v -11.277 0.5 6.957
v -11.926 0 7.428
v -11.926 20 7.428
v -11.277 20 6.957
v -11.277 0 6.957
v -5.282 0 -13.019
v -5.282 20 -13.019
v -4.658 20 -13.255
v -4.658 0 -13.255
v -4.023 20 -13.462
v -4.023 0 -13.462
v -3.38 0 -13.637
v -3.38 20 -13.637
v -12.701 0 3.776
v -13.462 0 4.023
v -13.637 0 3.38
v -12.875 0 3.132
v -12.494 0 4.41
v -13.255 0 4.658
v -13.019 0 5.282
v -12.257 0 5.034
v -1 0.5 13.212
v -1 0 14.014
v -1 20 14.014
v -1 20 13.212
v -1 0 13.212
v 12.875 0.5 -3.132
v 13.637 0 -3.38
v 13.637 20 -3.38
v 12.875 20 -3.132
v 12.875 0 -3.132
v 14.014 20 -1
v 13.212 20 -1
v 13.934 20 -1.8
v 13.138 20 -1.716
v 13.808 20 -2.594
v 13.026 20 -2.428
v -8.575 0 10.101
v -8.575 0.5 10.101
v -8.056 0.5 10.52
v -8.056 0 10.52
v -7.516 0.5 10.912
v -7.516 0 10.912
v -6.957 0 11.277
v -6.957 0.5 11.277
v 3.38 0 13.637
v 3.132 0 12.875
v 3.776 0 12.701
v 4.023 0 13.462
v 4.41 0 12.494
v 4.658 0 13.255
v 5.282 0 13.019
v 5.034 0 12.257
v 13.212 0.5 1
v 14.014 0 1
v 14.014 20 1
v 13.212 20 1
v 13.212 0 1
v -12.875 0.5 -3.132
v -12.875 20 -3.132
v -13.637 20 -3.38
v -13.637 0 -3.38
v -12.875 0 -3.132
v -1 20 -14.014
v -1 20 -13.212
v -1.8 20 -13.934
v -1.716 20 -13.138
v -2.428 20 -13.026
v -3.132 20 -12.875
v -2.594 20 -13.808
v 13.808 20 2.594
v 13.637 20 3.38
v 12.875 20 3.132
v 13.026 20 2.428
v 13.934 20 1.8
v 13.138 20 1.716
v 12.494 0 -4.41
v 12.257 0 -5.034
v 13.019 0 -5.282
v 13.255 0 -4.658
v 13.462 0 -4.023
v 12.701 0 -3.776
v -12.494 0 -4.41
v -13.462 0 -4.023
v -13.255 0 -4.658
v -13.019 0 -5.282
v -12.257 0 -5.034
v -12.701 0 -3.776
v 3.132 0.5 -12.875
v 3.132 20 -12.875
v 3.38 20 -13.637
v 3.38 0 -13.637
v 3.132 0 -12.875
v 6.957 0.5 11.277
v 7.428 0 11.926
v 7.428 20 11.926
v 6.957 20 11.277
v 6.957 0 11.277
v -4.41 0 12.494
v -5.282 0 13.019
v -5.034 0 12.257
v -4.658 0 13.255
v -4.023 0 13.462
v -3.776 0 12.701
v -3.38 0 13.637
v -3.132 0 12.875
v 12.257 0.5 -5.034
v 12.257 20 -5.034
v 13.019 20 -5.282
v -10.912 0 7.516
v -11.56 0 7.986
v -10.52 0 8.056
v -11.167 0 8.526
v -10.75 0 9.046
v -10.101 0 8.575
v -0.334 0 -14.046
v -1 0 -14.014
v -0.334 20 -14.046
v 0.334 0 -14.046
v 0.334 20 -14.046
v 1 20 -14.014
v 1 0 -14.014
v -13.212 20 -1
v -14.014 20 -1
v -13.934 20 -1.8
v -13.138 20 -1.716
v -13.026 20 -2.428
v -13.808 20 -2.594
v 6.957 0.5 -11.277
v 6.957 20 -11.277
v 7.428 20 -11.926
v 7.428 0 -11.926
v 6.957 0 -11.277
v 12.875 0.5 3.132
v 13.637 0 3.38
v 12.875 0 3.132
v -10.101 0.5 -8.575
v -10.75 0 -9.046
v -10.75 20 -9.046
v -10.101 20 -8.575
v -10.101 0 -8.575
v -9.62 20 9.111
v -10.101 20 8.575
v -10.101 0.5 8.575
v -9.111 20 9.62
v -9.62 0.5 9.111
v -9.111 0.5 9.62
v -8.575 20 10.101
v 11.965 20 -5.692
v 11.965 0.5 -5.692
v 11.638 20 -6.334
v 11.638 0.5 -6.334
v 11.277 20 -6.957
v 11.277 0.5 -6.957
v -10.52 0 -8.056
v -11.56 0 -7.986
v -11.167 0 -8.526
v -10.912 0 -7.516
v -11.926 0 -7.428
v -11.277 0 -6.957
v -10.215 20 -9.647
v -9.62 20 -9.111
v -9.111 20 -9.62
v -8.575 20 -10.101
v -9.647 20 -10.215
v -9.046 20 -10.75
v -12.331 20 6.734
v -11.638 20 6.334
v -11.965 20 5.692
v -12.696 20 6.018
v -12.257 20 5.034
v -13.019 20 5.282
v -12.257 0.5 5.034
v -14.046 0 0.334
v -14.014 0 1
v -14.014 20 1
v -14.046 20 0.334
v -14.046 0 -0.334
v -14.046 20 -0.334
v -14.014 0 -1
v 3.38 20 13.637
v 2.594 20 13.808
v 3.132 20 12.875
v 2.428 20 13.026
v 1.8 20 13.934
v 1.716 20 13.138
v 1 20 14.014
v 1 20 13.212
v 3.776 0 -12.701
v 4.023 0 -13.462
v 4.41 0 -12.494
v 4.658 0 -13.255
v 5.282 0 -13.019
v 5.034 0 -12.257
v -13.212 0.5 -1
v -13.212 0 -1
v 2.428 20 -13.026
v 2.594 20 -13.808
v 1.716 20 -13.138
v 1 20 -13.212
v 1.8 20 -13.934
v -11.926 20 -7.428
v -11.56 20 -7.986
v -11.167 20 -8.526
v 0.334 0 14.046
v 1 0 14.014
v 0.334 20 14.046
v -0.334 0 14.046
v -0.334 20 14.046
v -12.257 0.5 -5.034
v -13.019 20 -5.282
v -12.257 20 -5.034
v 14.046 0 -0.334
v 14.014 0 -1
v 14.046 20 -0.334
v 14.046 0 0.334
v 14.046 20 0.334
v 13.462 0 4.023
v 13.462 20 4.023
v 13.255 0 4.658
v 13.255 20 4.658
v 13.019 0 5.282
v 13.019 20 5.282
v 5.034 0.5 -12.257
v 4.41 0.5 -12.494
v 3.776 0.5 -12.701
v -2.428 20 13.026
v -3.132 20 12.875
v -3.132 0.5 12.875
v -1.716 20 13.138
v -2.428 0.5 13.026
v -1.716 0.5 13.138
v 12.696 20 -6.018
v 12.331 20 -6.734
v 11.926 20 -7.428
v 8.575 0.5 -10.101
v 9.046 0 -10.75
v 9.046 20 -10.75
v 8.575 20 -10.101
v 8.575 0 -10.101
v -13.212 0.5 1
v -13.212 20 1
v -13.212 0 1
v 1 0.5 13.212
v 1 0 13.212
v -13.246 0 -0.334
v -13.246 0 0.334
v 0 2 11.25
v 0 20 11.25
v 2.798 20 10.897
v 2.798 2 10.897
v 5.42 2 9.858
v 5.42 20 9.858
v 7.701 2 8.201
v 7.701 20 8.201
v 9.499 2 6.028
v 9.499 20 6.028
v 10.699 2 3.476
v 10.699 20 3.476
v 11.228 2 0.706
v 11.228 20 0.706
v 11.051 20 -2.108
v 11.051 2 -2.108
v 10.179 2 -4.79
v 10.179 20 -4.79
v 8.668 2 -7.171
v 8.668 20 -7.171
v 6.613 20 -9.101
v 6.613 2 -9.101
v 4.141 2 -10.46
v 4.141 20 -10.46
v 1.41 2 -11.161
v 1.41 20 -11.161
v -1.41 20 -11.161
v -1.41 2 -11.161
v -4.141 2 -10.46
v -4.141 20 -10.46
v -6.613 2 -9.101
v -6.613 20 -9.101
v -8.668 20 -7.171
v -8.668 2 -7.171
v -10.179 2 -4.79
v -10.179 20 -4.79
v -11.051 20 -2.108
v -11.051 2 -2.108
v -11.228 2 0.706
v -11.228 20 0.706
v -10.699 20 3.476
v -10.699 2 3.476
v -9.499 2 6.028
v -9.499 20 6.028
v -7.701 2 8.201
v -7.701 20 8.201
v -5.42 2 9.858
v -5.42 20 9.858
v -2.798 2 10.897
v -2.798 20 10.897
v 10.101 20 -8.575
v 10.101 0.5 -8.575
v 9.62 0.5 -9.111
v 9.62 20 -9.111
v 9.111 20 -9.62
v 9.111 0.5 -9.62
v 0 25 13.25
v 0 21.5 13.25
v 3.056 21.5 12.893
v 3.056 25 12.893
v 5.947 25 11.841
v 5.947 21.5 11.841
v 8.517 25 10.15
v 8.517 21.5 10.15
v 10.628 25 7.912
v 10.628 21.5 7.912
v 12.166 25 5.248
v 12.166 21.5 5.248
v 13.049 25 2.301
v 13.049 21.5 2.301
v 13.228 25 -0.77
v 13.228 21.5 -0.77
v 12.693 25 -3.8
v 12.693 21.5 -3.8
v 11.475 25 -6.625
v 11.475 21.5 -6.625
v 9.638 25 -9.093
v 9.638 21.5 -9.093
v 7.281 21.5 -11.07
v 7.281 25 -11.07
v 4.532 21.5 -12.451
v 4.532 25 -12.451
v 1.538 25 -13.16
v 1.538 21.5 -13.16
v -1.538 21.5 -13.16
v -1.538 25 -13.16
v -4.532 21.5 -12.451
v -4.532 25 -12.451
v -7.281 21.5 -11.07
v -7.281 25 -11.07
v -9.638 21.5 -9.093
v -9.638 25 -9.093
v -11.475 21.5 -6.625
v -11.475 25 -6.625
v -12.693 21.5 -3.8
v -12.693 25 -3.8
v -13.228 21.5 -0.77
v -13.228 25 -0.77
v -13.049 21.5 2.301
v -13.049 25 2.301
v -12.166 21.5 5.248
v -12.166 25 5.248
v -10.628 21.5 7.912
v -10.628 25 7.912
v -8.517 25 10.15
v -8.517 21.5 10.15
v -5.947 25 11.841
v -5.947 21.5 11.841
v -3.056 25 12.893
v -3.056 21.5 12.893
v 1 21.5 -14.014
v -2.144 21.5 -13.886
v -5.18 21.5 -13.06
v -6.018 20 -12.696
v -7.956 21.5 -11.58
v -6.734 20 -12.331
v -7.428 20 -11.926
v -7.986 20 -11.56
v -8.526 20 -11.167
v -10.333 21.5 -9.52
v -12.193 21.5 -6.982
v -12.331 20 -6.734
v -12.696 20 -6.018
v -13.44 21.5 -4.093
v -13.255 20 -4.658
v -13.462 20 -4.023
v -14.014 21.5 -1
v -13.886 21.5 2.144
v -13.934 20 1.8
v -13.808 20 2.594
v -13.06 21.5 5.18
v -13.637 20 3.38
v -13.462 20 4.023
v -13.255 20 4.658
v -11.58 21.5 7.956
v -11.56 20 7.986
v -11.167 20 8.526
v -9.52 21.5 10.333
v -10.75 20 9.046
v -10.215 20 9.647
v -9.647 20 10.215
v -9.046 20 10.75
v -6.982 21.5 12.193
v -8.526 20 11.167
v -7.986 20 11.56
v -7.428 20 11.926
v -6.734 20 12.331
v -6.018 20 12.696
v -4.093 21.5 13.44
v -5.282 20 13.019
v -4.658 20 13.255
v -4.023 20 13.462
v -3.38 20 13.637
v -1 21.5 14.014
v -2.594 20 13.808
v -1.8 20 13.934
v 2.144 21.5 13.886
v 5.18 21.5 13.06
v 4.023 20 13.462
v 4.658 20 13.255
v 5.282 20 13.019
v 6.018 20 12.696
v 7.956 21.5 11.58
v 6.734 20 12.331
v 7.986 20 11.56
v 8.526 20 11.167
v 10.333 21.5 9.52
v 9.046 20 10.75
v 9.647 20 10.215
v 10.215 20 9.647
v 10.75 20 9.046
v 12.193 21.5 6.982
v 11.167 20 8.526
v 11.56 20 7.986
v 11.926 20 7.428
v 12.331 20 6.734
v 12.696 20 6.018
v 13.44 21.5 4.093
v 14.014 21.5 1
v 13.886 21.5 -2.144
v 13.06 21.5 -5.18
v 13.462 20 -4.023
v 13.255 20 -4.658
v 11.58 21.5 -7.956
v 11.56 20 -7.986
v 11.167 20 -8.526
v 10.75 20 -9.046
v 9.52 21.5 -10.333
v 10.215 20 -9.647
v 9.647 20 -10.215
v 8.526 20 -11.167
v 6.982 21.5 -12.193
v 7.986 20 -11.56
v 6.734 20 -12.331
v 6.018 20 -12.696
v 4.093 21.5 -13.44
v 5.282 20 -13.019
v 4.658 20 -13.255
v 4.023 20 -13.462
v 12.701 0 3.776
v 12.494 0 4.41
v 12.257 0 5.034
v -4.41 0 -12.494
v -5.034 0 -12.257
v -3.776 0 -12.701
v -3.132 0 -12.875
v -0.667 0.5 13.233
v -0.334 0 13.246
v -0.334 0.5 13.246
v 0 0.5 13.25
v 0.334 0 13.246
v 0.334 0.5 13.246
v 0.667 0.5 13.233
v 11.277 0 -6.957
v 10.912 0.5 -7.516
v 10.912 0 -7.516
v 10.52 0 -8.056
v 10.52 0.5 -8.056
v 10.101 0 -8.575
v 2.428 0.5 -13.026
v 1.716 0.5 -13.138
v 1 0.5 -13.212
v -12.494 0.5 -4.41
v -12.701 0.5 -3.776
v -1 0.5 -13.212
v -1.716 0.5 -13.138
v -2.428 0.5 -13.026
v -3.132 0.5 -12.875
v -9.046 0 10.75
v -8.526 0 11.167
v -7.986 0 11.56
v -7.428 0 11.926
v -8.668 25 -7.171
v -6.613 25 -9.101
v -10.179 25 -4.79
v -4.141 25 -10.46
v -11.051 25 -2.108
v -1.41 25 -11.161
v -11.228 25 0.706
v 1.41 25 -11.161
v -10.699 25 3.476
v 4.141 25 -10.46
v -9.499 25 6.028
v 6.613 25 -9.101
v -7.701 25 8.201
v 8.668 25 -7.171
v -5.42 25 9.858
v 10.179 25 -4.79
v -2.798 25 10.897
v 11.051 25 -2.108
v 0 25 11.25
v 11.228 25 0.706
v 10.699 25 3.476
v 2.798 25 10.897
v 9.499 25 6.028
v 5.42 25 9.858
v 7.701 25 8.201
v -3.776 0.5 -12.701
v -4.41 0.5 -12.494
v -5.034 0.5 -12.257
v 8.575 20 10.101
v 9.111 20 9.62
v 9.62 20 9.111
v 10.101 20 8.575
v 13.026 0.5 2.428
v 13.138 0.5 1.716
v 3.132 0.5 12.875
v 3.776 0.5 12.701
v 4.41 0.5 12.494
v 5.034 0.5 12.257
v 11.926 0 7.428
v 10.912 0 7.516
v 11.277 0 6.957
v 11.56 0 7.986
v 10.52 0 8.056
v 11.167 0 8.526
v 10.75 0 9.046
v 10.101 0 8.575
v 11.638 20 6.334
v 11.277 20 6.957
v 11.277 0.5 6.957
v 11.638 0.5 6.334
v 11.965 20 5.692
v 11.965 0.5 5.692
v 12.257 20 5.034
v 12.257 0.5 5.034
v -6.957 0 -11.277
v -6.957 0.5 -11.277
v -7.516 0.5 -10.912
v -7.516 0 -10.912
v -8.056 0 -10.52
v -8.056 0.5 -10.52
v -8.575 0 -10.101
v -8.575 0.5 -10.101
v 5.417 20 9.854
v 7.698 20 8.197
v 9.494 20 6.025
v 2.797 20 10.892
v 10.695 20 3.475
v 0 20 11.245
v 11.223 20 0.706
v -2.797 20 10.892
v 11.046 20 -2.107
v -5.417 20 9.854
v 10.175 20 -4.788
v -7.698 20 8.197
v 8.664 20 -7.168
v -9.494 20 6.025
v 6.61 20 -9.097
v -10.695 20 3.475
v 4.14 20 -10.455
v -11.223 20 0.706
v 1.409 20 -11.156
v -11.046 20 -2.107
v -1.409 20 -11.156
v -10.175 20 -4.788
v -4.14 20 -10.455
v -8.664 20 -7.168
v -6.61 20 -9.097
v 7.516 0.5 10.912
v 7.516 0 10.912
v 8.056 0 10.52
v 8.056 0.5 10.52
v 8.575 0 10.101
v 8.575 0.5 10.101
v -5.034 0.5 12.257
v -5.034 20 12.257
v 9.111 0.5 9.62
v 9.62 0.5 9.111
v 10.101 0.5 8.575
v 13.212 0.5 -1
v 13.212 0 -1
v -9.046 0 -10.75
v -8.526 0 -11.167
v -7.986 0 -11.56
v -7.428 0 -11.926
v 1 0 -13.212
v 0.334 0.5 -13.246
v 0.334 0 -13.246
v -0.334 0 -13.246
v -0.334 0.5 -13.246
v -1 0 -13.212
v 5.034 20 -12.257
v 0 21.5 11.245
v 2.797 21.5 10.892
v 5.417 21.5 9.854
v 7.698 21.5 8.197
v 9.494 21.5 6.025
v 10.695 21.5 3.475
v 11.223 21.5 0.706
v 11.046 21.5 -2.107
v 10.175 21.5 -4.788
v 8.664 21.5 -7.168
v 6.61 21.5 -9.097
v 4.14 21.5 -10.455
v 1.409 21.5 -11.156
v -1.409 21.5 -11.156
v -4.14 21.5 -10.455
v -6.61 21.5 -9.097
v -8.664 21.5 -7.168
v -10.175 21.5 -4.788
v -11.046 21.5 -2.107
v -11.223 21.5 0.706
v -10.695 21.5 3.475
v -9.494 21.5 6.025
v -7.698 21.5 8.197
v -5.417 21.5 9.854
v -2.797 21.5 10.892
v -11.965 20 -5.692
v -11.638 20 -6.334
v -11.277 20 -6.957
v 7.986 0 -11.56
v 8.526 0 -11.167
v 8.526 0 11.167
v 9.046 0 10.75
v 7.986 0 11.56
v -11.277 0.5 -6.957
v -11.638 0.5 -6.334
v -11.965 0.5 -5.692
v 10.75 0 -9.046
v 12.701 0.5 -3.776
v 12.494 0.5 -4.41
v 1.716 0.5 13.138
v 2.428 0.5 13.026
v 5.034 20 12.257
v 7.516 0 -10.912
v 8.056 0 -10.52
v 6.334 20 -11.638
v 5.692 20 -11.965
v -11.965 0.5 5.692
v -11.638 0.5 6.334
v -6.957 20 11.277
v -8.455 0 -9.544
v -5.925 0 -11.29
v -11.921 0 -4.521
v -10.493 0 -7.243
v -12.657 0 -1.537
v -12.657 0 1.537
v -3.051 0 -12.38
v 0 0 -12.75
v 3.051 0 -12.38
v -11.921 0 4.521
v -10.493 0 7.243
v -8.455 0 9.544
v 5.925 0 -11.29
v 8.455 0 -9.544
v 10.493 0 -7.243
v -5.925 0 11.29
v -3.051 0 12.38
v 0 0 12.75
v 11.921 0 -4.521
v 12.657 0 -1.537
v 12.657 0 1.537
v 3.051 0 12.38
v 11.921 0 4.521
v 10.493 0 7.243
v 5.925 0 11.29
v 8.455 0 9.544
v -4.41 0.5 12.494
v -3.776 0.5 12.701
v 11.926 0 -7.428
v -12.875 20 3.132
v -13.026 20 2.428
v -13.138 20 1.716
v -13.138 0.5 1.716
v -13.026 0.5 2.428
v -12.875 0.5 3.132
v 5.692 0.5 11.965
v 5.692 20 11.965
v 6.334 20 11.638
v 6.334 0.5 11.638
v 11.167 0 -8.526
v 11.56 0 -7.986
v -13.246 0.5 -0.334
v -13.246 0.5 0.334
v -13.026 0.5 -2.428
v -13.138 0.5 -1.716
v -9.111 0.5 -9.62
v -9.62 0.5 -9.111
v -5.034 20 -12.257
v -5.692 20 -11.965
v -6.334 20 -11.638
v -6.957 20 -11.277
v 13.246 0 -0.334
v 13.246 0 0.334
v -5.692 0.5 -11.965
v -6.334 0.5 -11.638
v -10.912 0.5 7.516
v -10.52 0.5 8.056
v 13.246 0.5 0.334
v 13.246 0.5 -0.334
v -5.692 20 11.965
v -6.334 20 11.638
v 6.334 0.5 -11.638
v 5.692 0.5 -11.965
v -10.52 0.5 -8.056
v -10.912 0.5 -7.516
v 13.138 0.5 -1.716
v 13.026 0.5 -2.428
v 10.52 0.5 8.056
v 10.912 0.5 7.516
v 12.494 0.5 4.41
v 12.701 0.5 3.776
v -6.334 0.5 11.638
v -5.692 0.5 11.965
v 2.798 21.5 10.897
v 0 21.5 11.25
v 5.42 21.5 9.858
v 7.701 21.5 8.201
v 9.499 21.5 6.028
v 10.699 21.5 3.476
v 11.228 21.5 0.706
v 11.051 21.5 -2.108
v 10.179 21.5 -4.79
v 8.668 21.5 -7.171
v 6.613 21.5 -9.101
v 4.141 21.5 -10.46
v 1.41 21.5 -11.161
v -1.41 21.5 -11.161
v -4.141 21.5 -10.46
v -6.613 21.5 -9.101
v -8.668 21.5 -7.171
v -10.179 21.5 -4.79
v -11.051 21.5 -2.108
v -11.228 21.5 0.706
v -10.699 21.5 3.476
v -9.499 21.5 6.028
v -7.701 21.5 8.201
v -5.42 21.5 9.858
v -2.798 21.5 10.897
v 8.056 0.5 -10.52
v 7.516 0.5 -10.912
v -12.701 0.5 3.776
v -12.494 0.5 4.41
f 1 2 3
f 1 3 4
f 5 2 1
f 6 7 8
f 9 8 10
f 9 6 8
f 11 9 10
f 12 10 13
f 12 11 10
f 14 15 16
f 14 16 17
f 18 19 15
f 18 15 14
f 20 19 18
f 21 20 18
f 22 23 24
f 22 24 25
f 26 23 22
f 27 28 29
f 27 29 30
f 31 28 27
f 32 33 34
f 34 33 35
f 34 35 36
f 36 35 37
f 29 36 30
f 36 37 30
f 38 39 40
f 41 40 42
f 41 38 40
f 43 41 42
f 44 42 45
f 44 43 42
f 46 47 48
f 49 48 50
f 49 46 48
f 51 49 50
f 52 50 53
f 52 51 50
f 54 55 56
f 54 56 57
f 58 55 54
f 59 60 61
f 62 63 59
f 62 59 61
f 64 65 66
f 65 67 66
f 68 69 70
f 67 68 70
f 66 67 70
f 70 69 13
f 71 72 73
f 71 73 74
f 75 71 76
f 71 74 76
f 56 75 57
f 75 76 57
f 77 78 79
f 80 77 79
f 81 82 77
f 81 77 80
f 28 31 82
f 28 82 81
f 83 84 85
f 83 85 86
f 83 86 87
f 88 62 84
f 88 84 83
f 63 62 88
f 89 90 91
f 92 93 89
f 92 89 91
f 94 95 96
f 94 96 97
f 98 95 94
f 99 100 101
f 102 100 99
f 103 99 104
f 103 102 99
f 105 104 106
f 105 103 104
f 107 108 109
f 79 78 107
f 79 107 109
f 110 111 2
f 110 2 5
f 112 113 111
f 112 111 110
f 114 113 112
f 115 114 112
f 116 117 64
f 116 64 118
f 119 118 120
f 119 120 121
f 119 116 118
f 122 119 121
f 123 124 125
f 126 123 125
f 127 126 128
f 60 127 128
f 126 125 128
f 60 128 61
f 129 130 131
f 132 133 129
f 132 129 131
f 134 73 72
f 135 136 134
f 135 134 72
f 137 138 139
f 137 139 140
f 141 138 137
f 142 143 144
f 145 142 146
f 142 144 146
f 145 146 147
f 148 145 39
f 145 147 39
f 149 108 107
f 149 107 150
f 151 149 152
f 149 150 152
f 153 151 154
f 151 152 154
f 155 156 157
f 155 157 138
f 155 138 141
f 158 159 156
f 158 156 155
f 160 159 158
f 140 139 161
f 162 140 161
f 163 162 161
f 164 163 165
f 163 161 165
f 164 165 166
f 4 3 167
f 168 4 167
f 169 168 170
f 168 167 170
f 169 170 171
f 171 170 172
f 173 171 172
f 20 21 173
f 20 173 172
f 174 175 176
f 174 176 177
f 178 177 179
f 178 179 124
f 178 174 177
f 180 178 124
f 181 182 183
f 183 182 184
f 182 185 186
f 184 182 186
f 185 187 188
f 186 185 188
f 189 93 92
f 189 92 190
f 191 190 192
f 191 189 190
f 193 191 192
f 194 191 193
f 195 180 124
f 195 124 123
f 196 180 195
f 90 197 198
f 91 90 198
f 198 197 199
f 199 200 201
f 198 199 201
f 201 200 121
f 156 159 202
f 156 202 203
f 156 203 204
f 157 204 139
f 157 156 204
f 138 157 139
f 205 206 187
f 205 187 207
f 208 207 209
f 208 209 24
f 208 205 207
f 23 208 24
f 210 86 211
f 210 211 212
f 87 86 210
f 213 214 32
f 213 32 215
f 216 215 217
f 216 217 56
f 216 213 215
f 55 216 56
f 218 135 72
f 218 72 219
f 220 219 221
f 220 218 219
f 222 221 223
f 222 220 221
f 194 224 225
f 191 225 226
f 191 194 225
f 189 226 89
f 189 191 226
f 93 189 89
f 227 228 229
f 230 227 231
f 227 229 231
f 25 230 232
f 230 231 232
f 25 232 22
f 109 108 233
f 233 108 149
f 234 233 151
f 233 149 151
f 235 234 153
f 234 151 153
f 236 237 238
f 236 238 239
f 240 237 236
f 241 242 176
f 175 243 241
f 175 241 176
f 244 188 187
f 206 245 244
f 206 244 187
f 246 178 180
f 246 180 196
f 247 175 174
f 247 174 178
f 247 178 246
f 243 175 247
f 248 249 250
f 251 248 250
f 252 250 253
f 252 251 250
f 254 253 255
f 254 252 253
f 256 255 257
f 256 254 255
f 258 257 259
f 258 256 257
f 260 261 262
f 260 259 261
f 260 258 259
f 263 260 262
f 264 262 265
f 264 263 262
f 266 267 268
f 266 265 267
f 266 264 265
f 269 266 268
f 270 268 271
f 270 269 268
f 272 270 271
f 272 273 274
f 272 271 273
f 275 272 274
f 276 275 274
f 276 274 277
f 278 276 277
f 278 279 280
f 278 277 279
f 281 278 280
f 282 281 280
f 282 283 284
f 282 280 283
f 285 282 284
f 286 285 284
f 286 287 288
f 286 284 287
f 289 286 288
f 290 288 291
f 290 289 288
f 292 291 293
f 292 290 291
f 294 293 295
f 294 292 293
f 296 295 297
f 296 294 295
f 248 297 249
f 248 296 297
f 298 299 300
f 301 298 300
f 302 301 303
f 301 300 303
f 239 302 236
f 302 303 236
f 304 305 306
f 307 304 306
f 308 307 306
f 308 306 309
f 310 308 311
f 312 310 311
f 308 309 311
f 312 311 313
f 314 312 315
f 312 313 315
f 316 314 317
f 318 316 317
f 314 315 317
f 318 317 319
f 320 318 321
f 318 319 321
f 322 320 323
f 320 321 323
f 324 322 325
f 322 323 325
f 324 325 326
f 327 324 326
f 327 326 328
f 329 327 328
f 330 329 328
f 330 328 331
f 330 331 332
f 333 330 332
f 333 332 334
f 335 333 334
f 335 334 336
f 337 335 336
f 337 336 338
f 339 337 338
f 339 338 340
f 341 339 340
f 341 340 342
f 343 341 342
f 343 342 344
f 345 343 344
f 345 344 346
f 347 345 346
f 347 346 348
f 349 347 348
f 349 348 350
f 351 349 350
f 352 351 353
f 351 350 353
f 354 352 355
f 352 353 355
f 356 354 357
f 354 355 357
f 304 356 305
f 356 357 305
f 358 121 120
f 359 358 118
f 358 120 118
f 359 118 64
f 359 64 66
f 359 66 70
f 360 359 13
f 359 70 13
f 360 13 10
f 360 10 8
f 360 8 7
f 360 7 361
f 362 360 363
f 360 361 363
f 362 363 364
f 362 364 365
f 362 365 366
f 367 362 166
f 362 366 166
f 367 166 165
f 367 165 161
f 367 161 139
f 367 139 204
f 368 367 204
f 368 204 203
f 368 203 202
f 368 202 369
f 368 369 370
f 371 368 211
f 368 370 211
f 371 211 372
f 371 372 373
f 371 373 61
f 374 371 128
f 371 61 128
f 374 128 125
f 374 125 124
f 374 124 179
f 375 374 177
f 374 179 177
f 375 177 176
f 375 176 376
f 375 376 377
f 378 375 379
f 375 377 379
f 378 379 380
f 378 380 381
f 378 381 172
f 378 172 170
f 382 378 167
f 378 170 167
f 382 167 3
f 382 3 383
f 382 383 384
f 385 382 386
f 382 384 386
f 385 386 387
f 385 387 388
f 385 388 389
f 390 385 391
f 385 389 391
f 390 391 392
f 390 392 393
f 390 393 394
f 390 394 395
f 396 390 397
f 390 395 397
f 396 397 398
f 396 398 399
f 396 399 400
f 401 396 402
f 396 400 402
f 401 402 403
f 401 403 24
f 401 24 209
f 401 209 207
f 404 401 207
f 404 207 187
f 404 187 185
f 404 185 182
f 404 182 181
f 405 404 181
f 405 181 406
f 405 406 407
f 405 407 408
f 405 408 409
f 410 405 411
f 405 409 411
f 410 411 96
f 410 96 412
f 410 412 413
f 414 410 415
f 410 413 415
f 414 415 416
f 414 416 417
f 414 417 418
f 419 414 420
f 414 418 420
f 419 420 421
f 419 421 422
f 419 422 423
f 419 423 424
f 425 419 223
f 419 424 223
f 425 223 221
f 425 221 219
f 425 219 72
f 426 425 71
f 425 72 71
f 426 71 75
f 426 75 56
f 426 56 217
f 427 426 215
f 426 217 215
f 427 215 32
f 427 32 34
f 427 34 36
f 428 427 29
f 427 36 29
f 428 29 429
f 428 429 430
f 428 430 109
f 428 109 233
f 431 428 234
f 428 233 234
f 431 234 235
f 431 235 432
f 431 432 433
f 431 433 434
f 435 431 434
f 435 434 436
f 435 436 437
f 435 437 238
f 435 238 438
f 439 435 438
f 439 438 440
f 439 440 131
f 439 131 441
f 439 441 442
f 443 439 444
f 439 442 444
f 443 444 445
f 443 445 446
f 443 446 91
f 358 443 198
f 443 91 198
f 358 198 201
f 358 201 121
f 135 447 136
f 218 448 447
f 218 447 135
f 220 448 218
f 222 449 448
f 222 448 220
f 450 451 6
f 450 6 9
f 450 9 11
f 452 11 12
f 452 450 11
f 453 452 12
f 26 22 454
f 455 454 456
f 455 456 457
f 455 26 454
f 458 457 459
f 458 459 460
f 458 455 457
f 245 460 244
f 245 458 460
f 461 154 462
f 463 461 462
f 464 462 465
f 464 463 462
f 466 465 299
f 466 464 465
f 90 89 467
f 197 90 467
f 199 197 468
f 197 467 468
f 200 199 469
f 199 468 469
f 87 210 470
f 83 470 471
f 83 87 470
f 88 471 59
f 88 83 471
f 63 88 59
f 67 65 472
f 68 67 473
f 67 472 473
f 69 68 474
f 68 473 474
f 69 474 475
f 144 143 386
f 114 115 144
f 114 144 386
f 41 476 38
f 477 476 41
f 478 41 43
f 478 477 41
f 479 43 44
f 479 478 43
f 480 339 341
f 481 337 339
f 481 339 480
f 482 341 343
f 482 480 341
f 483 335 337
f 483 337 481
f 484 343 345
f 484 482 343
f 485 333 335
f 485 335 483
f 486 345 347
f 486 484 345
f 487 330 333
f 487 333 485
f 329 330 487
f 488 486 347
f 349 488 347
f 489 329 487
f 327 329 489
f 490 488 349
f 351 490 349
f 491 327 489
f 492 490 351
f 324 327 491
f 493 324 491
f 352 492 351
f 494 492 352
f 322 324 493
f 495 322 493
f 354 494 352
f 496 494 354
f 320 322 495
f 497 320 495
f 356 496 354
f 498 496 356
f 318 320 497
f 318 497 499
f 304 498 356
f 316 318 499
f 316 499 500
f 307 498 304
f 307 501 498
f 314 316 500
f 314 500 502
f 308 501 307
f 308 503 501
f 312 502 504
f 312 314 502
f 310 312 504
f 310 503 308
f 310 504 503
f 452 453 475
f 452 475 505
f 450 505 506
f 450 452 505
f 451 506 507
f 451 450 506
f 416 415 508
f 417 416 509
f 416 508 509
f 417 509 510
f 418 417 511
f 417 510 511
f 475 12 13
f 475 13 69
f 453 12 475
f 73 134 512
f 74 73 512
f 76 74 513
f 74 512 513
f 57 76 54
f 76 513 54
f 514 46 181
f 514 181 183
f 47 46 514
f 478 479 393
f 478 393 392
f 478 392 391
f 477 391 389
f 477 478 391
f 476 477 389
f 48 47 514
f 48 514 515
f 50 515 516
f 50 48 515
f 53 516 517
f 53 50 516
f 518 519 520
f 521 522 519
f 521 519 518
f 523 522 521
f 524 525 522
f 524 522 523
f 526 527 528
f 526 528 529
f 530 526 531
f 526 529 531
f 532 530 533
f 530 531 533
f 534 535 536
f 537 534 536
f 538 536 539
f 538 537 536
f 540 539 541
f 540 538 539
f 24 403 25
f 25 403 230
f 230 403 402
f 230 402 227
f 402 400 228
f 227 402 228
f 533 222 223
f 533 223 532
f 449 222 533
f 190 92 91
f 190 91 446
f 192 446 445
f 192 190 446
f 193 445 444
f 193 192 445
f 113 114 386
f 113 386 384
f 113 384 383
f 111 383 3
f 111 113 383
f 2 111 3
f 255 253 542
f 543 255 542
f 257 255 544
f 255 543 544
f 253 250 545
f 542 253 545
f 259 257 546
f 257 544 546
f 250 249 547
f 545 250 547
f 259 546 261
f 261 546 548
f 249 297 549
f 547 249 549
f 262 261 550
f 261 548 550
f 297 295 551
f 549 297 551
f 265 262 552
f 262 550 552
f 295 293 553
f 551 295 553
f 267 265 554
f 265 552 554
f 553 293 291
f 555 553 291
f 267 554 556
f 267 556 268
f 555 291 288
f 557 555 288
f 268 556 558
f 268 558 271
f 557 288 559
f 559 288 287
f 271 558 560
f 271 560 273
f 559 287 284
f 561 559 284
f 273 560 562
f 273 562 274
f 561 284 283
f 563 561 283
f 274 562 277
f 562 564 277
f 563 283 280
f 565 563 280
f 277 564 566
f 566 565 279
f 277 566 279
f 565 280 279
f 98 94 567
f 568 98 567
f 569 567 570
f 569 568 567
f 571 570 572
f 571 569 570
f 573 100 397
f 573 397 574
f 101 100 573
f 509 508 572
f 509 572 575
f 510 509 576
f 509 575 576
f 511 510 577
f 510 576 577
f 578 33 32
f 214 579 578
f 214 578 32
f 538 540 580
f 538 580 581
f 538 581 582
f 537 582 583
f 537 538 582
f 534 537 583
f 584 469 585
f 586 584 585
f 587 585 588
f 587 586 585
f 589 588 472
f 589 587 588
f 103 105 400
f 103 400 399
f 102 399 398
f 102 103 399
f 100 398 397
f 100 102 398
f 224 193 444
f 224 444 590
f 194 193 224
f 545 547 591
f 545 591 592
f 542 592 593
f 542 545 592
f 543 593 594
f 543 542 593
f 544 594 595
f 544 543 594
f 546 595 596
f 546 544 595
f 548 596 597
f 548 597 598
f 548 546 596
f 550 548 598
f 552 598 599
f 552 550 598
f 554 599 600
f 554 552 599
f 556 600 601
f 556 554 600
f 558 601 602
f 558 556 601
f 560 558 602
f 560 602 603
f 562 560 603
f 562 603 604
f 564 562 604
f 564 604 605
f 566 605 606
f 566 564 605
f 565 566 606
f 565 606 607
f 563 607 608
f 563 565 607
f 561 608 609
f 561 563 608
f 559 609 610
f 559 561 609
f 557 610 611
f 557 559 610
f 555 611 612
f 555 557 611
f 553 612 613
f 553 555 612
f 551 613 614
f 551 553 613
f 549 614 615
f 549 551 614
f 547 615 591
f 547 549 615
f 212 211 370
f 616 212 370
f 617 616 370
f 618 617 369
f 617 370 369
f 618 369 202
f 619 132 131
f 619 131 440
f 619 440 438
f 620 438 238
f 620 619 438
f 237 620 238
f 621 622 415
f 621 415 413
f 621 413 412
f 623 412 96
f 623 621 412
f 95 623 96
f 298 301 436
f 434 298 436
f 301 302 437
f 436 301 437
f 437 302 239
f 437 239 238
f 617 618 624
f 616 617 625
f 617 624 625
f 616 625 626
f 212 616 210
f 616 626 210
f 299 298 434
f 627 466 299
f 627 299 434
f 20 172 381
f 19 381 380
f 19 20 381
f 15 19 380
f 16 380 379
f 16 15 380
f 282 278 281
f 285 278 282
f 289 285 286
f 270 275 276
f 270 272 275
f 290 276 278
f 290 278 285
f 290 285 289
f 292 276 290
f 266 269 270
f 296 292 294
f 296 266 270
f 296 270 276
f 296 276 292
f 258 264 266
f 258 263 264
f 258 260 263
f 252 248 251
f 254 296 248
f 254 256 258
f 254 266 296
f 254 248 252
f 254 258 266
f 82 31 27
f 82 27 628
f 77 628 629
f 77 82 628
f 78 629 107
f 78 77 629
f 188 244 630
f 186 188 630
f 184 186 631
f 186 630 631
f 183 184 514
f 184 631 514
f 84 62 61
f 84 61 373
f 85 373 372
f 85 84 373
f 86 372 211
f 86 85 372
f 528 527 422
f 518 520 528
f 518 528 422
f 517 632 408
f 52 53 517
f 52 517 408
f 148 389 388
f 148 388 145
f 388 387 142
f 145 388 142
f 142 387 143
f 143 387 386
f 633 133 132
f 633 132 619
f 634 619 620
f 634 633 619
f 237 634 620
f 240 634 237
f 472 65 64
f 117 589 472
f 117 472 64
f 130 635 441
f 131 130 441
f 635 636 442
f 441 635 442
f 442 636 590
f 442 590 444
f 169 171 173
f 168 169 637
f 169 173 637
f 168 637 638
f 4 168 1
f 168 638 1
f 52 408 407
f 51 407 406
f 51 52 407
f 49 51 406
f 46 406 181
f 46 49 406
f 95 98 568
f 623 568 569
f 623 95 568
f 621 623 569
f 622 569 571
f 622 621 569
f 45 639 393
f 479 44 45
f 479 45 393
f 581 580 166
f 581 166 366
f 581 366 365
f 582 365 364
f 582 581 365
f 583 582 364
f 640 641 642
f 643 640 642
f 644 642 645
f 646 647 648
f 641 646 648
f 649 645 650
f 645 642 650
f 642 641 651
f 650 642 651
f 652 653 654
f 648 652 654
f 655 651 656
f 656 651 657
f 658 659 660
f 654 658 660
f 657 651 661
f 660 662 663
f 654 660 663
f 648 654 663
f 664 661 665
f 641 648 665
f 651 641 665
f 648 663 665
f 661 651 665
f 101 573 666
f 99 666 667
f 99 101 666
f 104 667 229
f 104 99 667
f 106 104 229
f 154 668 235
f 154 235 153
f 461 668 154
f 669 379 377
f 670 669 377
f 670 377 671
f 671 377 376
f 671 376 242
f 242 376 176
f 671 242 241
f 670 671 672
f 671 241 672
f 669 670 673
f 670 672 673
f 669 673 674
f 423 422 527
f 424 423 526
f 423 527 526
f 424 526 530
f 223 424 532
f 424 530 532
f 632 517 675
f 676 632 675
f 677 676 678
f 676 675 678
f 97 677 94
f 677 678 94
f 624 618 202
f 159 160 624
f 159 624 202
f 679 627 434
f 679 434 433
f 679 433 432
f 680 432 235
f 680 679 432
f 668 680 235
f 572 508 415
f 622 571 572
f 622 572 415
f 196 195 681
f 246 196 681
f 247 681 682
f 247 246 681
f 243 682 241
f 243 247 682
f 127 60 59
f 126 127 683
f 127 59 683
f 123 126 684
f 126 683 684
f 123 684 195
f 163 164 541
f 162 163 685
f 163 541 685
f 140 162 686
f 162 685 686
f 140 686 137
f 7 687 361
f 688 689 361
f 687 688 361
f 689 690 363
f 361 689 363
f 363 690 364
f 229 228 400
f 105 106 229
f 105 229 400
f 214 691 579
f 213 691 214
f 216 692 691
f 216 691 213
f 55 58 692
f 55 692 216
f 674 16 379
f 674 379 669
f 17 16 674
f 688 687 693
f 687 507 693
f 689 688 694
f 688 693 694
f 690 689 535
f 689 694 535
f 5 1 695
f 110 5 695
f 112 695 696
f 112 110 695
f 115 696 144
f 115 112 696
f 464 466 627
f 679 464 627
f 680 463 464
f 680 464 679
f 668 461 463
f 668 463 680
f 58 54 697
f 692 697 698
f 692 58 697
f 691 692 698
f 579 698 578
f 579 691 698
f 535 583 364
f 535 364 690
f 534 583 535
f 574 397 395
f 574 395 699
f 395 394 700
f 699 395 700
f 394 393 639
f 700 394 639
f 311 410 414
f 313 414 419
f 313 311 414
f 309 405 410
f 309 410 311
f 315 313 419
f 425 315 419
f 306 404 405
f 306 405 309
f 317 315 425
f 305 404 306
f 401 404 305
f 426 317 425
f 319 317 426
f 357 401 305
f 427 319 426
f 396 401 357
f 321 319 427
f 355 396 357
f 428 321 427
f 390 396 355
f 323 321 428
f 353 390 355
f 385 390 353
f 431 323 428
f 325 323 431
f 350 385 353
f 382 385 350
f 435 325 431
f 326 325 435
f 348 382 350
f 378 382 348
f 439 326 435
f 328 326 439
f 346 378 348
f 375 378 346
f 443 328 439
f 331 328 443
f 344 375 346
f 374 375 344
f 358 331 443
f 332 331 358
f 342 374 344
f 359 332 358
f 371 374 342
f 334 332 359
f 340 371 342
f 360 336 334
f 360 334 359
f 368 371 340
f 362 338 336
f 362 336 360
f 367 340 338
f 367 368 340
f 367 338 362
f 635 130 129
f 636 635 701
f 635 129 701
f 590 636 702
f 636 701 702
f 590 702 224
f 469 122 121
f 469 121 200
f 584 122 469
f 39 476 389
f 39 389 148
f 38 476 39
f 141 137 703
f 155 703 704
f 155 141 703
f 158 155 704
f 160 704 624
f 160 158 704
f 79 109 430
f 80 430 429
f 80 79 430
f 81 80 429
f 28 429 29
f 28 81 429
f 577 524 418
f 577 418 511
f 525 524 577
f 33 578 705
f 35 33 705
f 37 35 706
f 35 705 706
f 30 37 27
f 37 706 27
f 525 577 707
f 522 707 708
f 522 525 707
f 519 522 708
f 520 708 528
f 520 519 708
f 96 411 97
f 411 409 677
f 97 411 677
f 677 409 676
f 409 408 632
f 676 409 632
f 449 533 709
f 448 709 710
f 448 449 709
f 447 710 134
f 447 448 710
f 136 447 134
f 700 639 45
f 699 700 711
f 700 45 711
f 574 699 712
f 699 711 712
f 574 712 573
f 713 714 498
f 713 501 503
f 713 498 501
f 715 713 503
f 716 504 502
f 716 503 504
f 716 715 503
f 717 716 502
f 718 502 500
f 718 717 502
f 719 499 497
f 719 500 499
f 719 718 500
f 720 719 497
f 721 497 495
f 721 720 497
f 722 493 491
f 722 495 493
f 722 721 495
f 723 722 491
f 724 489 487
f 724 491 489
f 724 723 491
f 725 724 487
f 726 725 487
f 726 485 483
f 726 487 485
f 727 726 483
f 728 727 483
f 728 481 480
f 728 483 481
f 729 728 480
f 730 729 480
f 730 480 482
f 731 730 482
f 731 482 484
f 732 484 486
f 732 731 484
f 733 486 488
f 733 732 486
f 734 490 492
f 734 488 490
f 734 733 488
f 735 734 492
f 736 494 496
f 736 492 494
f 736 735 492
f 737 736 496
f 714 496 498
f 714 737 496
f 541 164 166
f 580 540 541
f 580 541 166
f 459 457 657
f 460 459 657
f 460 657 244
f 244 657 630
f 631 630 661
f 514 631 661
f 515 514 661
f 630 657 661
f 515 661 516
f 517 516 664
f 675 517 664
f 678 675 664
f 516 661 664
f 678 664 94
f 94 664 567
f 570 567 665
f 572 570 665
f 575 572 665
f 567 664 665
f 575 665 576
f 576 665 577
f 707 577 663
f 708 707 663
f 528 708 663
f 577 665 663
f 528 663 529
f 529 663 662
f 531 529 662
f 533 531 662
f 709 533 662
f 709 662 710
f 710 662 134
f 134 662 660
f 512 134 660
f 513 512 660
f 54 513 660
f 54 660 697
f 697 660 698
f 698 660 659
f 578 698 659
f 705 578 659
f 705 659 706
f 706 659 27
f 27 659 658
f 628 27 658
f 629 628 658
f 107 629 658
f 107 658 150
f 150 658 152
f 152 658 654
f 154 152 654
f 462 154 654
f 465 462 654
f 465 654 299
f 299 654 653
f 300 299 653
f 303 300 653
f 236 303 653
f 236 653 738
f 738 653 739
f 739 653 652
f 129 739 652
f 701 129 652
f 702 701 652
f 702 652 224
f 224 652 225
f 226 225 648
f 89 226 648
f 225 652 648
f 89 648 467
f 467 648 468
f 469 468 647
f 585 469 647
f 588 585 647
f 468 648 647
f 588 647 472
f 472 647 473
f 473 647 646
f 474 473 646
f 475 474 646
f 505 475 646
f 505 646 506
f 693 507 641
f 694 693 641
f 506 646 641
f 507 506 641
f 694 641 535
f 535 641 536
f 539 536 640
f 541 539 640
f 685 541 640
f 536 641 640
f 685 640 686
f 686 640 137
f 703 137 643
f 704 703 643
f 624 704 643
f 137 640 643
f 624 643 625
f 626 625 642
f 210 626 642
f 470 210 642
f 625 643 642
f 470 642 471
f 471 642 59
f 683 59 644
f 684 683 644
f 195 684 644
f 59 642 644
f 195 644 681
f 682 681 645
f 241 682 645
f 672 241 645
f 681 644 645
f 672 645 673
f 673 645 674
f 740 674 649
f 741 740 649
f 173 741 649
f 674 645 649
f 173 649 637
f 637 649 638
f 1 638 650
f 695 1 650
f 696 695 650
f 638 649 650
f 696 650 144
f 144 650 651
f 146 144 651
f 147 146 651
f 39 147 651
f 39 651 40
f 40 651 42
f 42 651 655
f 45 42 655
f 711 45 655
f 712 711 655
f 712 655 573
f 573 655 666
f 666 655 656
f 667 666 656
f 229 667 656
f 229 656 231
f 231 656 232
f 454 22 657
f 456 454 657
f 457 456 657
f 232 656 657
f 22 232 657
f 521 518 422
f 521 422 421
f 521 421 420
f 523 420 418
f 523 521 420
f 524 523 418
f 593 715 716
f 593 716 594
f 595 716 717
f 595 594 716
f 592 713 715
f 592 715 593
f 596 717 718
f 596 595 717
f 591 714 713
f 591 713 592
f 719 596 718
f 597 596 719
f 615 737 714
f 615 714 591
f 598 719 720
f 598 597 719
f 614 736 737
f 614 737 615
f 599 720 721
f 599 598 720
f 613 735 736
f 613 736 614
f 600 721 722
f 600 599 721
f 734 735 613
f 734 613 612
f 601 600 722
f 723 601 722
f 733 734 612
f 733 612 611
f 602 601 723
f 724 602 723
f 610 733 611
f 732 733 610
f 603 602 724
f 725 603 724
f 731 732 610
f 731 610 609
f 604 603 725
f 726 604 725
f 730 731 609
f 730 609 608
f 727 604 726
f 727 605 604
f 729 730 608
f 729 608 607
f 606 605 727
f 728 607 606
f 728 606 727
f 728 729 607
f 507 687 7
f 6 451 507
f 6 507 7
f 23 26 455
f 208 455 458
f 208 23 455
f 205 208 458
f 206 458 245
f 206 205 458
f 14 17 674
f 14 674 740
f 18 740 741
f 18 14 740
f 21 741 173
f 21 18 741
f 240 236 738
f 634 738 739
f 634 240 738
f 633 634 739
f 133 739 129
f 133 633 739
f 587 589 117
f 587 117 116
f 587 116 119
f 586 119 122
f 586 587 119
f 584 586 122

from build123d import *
from build123d.topology import SkipClean

# Parameters (mm, degrees)
SKETCH_1_R      = 13.25
EXTRUDE_1_DEPTH = 25
SHELL_1_T       = -2
CHAMFER_1_SIZE  = 0.5
EXTRUDE_2_DEPTH = 20
SKETCH_3_R      = 14.05
SKETCH_3_R_2    = 11.244970287
EXTRUDE_3_DEPTH = 1.5


with BuildPart() as part:
    # 草图1 → 拉伸1 (new body)
    with BuildSketch(Plane(origin=(0, 0, 0), x_dir=(1, 0, 0), z_dir=(0, 1, 0))):
        with Locations(Location((0, 0, 0), (0, 0, 270))):
            Circle(SKETCH_1_R)
    extrude(amount=EXTRUDE_1_DEPTH)

    # 抽壳1
    shell_1_openings = [part.faces().sort_by_distance(p)[0] for p in [
        (0, 25, 0),
    ]]
    offset(amount=SHELL_1_T, openings=shell_1_openings, kind=Kind.INTERSECTION)

    # 倒角1
    chamfer_1_edges = [part.edges().sort_by_distance(p)[0] for p in [
        (0, 0, -13.25),
    ]]
    chamfer(chamfer_1_edges, length=CHAMFER_1_SIZE)

    # 草图2 → 拉伸2 (add)
    with BuildSketch(Plane.XZ):
        with BuildLine():
            Line((5.03385402, 12.25654167), (5.281734279, 13.01943866))
            ThreePointArc((5.281734279, 13.01943866), (4.341688771, 13.362344054), (3.379621246, 13.637472648))
            Line((3.379621246, 13.637472648), (3.131740988, 12.874575658))
            ThreePointArc((3.131740988, 12.874575658), (4.094475175, 12.601498841), (5.03385402, 12.25654167))
        make_face()
        with BuildLine():
            Line((1, 13.212210262), (1, 14.014367628))
            ThreePointArc((1, 14.014367628), (0, 14.05), (-1, 14.014367628))
            Line((-1, 14.014367628), (-1, 13.212210262))
            ThreePointArc((-1, 13.212210262), (0, 13.25), (1, 13.212210262))
        make_face()
        with BuildLine():
            Line((8.574959336, 10.101117383), (9.046455606, 10.750076324))
            ThreePointArc((9.046455606, 10.750076324), (8.258382795, 11.366688771), (7.428421617, 11.925646828))
            Line((7.428421617, 11.925646828), (6.956925348, 11.276687887))
            ThreePointArc((6.956925348, 11.276687887), (7.788154593, 10.719475175), (8.574959336, 10.101117383))
        make_face()
        with BuildLine():
            Line((11.276687887, 6.956925348), (11.925646828, 7.428421617))
            ThreePointArc((11.925646828, 7.428421617), (11.366688771, 8.258382795), (10.750076324, 9.046455606))
            Line((10.750076324, 9.046455606), (10.101117383, 8.574959336))
            ThreePointArc((10.101117383, 8.574959336), (10.719475175, 7.788154593), (11.276687887, 6.956925348))
        make_face()
        with BuildLine():
            Line((12.874575658, 3.131740988), (13.637472648, 3.379621246))
            ThreePointArc((13.637472648, 3.379621246), (13.362344054, 4.341688771), (13.01943866, 5.281734279))
            Line((13.01943866, 5.281734279), (12.25654167, 5.03385402))
            ThreePointArc((12.25654167, 5.03385402), (12.601498841, 4.094475175), (12.874575658, 3.131740988))
        make_face()
        with BuildLine():
            Line((13.212210262, -1), (14.014367628, -1))
            ThreePointArc((14.014367628, -1), (14.05, 0), (14.014367628, 1))
            Line((14.014367628, 1), (13.212210262, 1))
            ThreePointArc((13.212210262, 1), (13.25, 0), (13.212210262, -1))
        make_face()
        with BuildLine():
            Line((12.25654167, -5.03385402), (13.01943866, -5.281734279))
            ThreePointArc((13.01943866, -5.281734279), (13.362344054, -4.341688771), (13.637472648, -3.379621246))
            Line((13.637472648, -3.379621246), (12.874575658, -3.131740988))
            ThreePointArc((12.874575658, -3.131740988), (12.601498841, -4.094475175), (12.25654167, -5.03385402))
        make_face()
        with BuildLine():
            Line((10.101117383, -8.574959336), (10.750076324, -9.046455606))
            ThreePointArc((10.750076324, -9.046455606), (11.366688771, -8.258382795), (11.925646828, -7.428421617))
            Line((11.925646828, -7.428421617), (11.276687887, -6.956925348))
            ThreePointArc((11.276687887, -6.956925348), (10.719475175, -7.788154593), (10.101117383, -8.574959336))
        make_face()
        with BuildLine():
            Line((6.956925348, -11.276687887), (7.428421617, -11.925646828))
            ThreePointArc((7.428421617, -11.925646828), (8.258382795, -11.366688771), (9.046455606, -10.750076324))
            Line((9.046455606, -10.750076324), (8.574959336, -10.101117383))
            ThreePointArc((8.574959336, -10.101117383), (7.788154593, -10.719475175), (6.956925348, -11.276687887))
        make_face()
        with BuildLine():
            Line((3.131740988, -12.874575658), (3.379621246, -13.637472648))
            ThreePointArc((3.379621246, -13.637472648), (4.341688771, -13.362344054), (5.281734279, -13.01943866))
            Line((5.281734279, -13.01943866), (5.03385402, -12.25654167))
            ThreePointArc((5.03385402, -12.25654167), (4.094475175, -12.601498841), (3.131740988, -12.874575658))
        make_face()
        with BuildLine():
            Line((-1, -13.212210262), (-1, -14.014367628))
            ThreePointArc((-1, -14.014367628), (0, -14.05), (1, -14.014367628))
            Line((1, -14.014367628), (1, -13.212210262))
            ThreePointArc((1, -13.212210262), (0, -13.25), (-1, -13.212210262))
        make_face()
        with BuildLine():
            Line((-5.03385402, -12.25654167), (-5.281734279, -13.01943866))
            ThreePointArc((-5.281734279, -13.01943866), (-4.341688771, -13.362344054), (-3.379621246, -13.637472648))
            Line((-3.379621246, -13.637472648), (-3.131740988, -12.874575658))
            ThreePointArc((-3.131740988, -12.874575658), (-4.094475175, -12.601498841), (-5.03385402, -12.25654167))
        make_face()
        with BuildLine():
            Line((-8.574959336, -10.101117383), (-9.046455606, -10.750076324))
            ThreePointArc((-9.046455606, -10.750076324), (-8.258382795, -11.366688771), (-7.428421617, -11.925646828))
            Line((-7.428421617, -11.925646828), (-6.956925348, -11.276687887))
            ThreePointArc((-6.956925348, -11.276687887), (-7.788154593, -10.719475175), (-8.574959336, -10.101117383))
        make_face()
        with BuildLine():
            Line((-11.276687887, -6.956925348), (-11.925646828, -7.428421617))
            ThreePointArc((-11.925646828, -7.428421617), (-11.366688771, -8.258382795), (-10.750076324, -9.046455606))
            Line((-10.750076324, -9.046455606), (-10.101117383, -8.574959336))
            ThreePointArc((-10.101117383, -8.574959336), (-10.719475175, -7.788154593), (-11.276687887, -6.956925348))
        make_face()
        with BuildLine():
            Line((-12.874575658, -3.131740988), (-13.637472648, -3.379621246))
            ThreePointArc((-13.637472648, -3.379621246), (-13.362344054, -4.341688771), (-13.01943866, -5.281734279))
            Line((-13.01943866, -5.281734279), (-12.25654167, -5.03385402))
            ThreePointArc((-12.25654167, -5.03385402), (-12.601498841, -4.094475175), (-12.874575658, -3.131740988))
        make_face()
        with BuildLine():
            Line((-13.212210262, 1), (-14.014367628, 1))
            ThreePointArc((-14.014367628, 1), (-14.05, 0), (-14.014367628, -1))
            Line((-14.014367628, -1), (-13.212210262, -1))
            ThreePointArc((-13.212210262, -1), (-13.25, 0), (-13.212210262, 1))
        make_face()
        with BuildLine():
            Line((-12.25654167, 5.03385402), (-13.01943866, 5.281734279))
            ThreePointArc((-13.01943866, 5.281734279), (-13.362344054, 4.341688771), (-13.637472648, 3.379621246))
            Line((-13.637472648, 3.379621246), (-12.874575658, 3.131740988))
            ThreePointArc((-12.874575658, 3.131740988), (-12.601498841, 4.094475175), (-12.25654167, 5.03385402))
        make_face()
        with BuildLine():
            Line((-10.101117383, 8.574959336), (-10.750076324, 9.046455606))
            ThreePointArc((-10.750076324, 9.046455606), (-11.366688771, 8.258382795), (-11.925646828, 7.428421617))
            Line((-11.925646828, 7.428421617), (-11.276687887, 6.956925348))
            ThreePointArc((-11.276687887, 6.956925348), (-10.719475175, 7.788154593), (-10.101117383, 8.574959336))
        make_face()
        with BuildLine():
            Line((-6.956925348, 11.276687887), (-7.428421617, 11.925646828))
            ThreePointArc((-7.428421617, 11.925646828), (-8.258382795, 11.366688771), (-9.046455606, 10.750076324))
            Line((-9.046455606, 10.750076324), (-8.574959336, 10.101117383))
            ThreePointArc((-8.574959336, 10.101117383), (-7.788154593, 10.719475175), (-6.956925348, 11.276687887))
        make_face()
        with BuildLine():
            Line((-3.131740988, 12.874575658), (-3.379621246, 13.637472648))
            ThreePointArc((-3.379621246, 13.637472648), (-4.341688771, 13.362344054), (-5.281734279, 13.01943866))
            Line((-5.281734279, 13.01943866), (-5.03385402, 12.25654167))
            ThreePointArc((-5.03385402, 12.25654167), (-4.094475175, 12.601498841), (-3.131740988, 12.874575658))
        make_face()
    extrude(amount=-EXTRUDE_2_DEPTH)

    # 草图3 → 拉伸3 (add)
    with SkipClean():  # the faces are left unmerged after this step: merging them gives an invalid solid
        with BuildSketch(Plane(origin=(0, 20, 0), x_dir=(1, 0, 0), z_dir=(0, 1, 0))):
            with Locations(Location((0, 0, 0), (0, 0, 85.91855766))):
                Circle(SKETCH_3_R)
            with Locations(Location((0, 0, 0), (0, 0, 270))):
                Circle(SKETCH_3_R_2, mode=Mode.SUBTRACT)
        extrude(amount=EXTRUDE_3_DEPTH)


solid = part.part
